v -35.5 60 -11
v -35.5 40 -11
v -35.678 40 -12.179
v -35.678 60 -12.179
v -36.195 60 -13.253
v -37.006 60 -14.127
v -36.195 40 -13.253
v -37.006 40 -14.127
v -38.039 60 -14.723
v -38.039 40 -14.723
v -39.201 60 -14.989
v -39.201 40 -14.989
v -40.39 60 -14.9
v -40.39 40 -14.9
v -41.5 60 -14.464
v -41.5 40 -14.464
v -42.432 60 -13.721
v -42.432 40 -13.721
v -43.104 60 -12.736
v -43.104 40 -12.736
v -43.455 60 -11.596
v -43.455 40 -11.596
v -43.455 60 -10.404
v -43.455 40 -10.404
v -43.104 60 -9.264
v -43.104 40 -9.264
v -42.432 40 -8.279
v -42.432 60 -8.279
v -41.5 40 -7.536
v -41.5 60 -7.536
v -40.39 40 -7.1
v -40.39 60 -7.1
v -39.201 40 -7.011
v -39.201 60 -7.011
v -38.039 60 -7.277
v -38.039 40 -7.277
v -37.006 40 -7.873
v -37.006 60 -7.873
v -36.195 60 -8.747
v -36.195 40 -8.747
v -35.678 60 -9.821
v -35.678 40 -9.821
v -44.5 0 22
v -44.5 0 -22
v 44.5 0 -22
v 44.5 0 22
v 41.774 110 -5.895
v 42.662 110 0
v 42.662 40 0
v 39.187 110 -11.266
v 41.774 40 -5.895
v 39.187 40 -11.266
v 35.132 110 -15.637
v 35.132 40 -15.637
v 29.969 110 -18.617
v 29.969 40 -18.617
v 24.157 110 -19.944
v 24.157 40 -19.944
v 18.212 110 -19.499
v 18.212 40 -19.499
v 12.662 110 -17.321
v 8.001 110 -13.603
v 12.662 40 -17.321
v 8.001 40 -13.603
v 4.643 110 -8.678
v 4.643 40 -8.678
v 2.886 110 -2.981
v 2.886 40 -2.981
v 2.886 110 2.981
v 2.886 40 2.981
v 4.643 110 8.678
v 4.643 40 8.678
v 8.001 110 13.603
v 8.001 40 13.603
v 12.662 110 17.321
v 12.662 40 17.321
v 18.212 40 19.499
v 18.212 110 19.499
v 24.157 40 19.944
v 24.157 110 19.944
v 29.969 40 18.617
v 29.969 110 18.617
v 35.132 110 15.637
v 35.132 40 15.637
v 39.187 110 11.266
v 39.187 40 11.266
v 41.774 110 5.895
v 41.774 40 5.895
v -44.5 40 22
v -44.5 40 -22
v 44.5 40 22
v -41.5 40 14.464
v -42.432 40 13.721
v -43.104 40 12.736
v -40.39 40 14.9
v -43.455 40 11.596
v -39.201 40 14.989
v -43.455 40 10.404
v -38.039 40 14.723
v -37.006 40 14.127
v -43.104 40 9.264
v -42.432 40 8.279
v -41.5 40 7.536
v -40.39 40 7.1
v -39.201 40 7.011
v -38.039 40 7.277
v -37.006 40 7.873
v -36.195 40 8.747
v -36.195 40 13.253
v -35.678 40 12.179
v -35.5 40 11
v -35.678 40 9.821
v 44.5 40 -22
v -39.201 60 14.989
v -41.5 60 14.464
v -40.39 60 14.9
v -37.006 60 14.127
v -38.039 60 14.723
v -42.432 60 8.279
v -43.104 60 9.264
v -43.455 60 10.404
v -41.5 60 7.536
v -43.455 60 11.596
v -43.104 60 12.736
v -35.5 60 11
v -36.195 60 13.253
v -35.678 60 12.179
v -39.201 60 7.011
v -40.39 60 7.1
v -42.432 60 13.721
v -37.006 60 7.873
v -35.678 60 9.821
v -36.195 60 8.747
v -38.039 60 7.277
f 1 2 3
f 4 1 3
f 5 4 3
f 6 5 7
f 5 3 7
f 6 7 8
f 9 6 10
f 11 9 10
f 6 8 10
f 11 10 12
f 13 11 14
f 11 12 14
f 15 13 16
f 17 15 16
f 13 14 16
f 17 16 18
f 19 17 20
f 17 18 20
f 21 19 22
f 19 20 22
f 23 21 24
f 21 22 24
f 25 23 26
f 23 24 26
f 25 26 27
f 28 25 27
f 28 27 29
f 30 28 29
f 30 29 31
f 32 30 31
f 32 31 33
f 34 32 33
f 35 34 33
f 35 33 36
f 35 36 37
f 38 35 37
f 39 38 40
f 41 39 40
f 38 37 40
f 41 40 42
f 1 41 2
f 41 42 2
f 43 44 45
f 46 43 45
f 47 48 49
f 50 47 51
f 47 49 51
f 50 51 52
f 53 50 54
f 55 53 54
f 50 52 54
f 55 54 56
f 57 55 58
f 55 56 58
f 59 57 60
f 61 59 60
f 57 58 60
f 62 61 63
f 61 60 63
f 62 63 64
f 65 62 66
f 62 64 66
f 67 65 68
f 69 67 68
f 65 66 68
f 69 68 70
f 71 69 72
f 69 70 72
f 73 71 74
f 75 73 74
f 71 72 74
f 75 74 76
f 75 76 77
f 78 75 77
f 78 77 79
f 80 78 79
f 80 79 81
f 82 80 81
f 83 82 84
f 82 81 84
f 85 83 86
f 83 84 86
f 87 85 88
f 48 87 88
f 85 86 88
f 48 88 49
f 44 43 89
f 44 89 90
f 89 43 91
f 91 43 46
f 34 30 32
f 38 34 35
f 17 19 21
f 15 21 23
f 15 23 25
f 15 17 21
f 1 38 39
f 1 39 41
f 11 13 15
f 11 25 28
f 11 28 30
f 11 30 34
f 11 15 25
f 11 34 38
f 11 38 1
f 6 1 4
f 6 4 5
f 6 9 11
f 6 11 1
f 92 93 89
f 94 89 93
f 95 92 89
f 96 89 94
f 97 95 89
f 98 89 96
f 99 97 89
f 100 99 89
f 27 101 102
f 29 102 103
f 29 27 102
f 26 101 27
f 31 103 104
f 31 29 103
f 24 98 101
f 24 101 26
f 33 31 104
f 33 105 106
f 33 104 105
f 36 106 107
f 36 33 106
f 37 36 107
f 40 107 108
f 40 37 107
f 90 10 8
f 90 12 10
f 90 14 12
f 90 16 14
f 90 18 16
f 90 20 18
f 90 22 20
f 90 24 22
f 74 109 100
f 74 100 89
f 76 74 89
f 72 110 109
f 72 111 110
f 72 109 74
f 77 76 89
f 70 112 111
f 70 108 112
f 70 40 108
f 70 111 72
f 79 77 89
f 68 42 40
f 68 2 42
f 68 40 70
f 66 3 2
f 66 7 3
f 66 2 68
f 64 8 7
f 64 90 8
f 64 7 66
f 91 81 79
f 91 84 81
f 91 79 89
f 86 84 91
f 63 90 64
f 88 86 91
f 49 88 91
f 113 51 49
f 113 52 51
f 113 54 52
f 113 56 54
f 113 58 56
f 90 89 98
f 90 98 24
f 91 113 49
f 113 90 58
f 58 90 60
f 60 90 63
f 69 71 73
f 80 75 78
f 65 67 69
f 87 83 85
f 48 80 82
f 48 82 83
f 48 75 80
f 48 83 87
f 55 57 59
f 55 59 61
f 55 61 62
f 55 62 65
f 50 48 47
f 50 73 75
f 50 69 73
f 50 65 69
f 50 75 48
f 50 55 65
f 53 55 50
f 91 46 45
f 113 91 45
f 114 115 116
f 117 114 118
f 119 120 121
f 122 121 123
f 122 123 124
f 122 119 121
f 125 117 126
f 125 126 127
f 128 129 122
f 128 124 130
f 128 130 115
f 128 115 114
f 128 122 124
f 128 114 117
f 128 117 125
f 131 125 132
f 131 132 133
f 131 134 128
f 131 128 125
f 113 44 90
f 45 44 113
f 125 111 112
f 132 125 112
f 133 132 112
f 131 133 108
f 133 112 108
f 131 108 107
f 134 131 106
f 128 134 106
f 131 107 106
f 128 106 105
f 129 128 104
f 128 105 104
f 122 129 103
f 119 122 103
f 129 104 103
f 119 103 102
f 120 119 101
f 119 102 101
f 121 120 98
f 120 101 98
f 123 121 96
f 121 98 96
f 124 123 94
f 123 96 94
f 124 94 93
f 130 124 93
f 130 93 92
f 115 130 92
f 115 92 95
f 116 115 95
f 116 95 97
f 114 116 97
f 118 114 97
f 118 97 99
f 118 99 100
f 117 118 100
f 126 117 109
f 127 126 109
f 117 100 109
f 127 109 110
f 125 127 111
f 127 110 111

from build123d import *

# Parameters (mm, degrees)
SKETCH3_W           = 89
SKETCH3_H           = 44
BOSS_EXTRUDE1_DEPTH = 40
SKETCH4_R           = 20
BOSS_EXTRUDE2_DEPTH = 70
SKETCH5_R           = 4
BOSS_EXTRUDE3_DEPTH = 20


with BuildPart() as part:
    # Sketch3 → Boss-Extrude1 (new body)
    with BuildSketch(Plane(origin=(0, 0, 0), x_dir=(1, 0, 0), z_dir=(0, 1, 0))):
        Rectangle(SKETCH3_W, SKETCH3_H)
    extrude(amount=BOSS_EXTRUDE1_DEPTH)

    # Sketch4 → Boss-Extrude2 (add)
    with BuildSketch(Plane(origin=(0, 40, 0), x_dir=(1, 0, 0), z_dir=(0, 1, 0))):
        with Locations((22.662485516, 0)):
            Circle(SKETCH4_R)
    extrude(amount=BOSS_EXTRUDE2_DEPTH)

    # Sketch5 → Boss-Extrude3 (add)
    with BuildSketch(Plane(origin=(0, 40, 0), x_dir=(1, 0, 0), z_dir=(0, 1, 0))):
        with Locations((-39.5, -11)):
            Circle(SKETCH5_R)
        with Locations((-39.5, 11)):
            Circle(SKETCH5_R)
    extrude(amount=BOSS_EXTRUDE3_DEPTH)


solid = part.part
